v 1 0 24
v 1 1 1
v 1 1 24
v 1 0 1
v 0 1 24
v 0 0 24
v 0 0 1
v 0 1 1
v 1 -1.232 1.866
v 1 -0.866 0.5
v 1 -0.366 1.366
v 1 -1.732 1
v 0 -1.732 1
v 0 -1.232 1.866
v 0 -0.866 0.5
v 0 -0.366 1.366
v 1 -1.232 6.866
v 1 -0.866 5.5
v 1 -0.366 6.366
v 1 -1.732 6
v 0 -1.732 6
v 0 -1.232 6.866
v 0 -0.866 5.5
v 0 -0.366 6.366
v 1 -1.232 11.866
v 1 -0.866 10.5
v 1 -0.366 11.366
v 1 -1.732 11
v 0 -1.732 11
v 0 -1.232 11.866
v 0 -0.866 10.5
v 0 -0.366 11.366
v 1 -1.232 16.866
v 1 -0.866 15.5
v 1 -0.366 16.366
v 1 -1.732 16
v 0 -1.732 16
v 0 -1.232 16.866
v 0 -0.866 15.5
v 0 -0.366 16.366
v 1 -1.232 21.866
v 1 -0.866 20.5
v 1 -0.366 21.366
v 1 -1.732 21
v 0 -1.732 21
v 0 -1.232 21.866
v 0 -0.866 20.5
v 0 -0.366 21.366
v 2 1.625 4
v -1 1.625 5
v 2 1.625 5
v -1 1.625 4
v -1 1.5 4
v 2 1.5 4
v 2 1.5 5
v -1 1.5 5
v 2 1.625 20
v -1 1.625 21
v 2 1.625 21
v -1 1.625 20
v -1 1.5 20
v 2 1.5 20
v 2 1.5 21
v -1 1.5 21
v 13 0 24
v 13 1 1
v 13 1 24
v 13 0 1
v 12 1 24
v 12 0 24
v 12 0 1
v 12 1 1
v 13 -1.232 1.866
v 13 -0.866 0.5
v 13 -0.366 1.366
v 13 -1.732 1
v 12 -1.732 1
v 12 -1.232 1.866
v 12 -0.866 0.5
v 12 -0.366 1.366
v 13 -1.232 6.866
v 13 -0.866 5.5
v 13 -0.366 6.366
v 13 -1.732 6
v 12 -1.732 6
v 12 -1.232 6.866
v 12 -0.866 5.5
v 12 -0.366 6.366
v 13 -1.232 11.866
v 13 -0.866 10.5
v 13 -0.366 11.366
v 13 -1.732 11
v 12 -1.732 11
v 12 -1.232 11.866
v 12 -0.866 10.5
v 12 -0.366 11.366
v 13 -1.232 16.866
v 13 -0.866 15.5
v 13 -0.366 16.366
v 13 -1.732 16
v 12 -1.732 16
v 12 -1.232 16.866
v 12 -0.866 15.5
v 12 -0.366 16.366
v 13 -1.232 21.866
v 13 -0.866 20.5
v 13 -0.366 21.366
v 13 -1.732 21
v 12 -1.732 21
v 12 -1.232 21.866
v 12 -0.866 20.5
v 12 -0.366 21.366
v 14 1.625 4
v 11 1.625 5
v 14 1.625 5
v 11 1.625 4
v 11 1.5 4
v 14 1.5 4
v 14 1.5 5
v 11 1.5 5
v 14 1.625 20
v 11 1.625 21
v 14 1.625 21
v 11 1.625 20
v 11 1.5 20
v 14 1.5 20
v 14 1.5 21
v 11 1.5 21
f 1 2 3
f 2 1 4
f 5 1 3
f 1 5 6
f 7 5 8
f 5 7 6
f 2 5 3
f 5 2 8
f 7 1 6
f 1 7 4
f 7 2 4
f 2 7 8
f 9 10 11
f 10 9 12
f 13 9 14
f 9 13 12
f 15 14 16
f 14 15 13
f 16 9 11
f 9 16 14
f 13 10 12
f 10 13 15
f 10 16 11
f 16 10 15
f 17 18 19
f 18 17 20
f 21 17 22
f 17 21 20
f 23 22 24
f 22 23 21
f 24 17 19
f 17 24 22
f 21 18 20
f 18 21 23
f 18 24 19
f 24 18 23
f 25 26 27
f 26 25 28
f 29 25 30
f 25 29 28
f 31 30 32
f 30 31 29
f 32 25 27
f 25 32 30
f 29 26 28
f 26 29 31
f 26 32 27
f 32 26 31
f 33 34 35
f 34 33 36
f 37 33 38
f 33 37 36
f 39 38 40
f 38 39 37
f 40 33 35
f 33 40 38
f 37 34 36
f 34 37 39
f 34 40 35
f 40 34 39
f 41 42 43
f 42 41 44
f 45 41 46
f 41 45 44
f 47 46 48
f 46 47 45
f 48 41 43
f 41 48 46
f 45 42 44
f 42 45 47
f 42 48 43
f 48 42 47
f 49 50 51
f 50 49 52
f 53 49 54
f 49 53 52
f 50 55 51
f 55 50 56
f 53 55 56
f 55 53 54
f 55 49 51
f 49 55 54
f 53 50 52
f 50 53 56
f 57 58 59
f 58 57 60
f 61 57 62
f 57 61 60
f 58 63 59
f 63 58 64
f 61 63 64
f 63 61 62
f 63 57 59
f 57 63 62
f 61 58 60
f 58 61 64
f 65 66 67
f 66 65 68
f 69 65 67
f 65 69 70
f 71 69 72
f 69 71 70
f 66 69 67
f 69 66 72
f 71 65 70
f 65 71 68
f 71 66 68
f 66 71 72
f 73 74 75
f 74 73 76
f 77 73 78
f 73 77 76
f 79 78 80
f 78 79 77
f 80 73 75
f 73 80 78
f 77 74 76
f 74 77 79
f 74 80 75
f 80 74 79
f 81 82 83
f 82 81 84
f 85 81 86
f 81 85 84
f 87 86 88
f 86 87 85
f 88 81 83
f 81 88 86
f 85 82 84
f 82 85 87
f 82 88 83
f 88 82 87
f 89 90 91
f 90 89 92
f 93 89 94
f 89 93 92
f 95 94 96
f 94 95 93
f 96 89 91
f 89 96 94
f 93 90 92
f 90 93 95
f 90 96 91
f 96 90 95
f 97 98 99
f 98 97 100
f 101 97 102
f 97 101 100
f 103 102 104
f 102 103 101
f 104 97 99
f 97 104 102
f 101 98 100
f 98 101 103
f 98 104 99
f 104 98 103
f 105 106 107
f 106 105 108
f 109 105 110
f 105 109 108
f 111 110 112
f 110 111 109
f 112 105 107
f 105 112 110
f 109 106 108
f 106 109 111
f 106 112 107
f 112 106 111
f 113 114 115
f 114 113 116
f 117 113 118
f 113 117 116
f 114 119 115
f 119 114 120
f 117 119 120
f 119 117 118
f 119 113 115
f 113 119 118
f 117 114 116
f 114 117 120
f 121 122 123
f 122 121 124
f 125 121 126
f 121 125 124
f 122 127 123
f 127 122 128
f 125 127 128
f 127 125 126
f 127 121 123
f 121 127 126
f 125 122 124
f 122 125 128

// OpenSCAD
// file: parts.scad
module rectangularTube(height, width, length, thickness) {
    difference()
    {
        cube([height, width, length]);
        // Ensure the inside sticks out a bit more to avoid clipping
        translate([thickness, thickness, -1]) {
            cube([height - 2*thickness, width - 2*thickness, length+2]);
        };
    }
};

module angleIron(height, width, length, thickness) {
    union()
    {
        cube([height, thickness, length]);
        rotate([0, -90, 0]) {
            translate([0, 0, -1 * thickness]) {
                cube([length, width, thickness]);
            }
        }
    }
}

module circularTube(outer, thickness, length) {
    outerRadius = outer / 2;
    innerRadius = outerRadius - thickness;
    difference() {
        cylinder(length, outerRadius, outerRadius, $fn=32);
        // Ensure the inside sticks out a bit more to avoid clipping
        translate([0, 0, -1]) {
            cylinder(length + 2, innerRadius, innerRadius, $fn=32);
        }
    }

}

module sheet(width, length, thickness) {
    cube([width, length, thickness]);
}

module circularBar(diameter, length) {
        cylinder(h=length, r1=diameter/2, r2=diameter/2, $fn=32);
}

module flatBar(thickness, width, length) {
    cube([width, length, thickness]);
}

module perforatedPlate(length, width, thickness, holeSize, holeSpacing) {
    radius = holeSize / 2;
    difference() {
        cube([length, width, thickness]);
        for( x = [ 0:holeSpacing:length ] ) {
            for ( y = [ 0:holeSpacing:width ]){
                translate([x, y, 0]){
                    cylinder( thickness*10 , radius, radius, $fn=32, center=true) ;
                }
            }
        }
    }
}


rectangularTube(4, 4, 12, .25);

translate([ 10, 0, 0]) {
    angleIron( 4, 4, 12, .25);
}

translate([ 22, 2, 0]) {
    circularTube(4, .25, 12);
}

translate([ 30, 0, 0]) {
    rotate([90, 0, 0]) {
        flatBar(.25, 4, 12);
    }
}

translate([ 40, 2, 0]) {
    circularBar(4, 12);
}

translate([ 50, 0, 0]) {
    rotate([270, 270, 0]) perforatedPlate(12, 6, .036, .067, .5);
}

translate([ 60, 0, 0]) {
    rotate([270, 270, 0]) sheet( 10, 10, .125 );
}
// main file
use <parts.scad>;

height = 24;
shelfLength = 2;
barThickness = .125;
mountSpacing = 4;
mountLength = 3;
mountDepth = .5;
holderLength = 2;
holderSpacing = 5;


module rack_bar() {
    rectangularTube(1, 1, height);

    for( height = [ 0:holderSpacing:height -1 ]) {
        translate([0, 0, height]) {
            translate([0, 0, 0]) {
                rotate([60, 0, 0]) {
                    rectangularTube(1, 1, holderLength);
                }
            }
        }
    }

    translate([0, mountDepth, mountSpacing]) {
        rectangularTube(1,1,1);
        translate([2, 1, 1]) {
            rotate([0, 90, 90]) {
                flatBar(barThickness, 1, mountLength);
            }
        }
    }

    translate([0, mountDepth, height - mountSpacing]) {
        rectangularTube(1,1,1);
        translate([2, 1, 1]) {
            rotate([0, 90, 90]) {
                flatBar(barThickness, 1, mountLength);
            }
        }
    }
}



translate([12, 0, ,0]) {
    rack_bar();
}
rack_bar();
